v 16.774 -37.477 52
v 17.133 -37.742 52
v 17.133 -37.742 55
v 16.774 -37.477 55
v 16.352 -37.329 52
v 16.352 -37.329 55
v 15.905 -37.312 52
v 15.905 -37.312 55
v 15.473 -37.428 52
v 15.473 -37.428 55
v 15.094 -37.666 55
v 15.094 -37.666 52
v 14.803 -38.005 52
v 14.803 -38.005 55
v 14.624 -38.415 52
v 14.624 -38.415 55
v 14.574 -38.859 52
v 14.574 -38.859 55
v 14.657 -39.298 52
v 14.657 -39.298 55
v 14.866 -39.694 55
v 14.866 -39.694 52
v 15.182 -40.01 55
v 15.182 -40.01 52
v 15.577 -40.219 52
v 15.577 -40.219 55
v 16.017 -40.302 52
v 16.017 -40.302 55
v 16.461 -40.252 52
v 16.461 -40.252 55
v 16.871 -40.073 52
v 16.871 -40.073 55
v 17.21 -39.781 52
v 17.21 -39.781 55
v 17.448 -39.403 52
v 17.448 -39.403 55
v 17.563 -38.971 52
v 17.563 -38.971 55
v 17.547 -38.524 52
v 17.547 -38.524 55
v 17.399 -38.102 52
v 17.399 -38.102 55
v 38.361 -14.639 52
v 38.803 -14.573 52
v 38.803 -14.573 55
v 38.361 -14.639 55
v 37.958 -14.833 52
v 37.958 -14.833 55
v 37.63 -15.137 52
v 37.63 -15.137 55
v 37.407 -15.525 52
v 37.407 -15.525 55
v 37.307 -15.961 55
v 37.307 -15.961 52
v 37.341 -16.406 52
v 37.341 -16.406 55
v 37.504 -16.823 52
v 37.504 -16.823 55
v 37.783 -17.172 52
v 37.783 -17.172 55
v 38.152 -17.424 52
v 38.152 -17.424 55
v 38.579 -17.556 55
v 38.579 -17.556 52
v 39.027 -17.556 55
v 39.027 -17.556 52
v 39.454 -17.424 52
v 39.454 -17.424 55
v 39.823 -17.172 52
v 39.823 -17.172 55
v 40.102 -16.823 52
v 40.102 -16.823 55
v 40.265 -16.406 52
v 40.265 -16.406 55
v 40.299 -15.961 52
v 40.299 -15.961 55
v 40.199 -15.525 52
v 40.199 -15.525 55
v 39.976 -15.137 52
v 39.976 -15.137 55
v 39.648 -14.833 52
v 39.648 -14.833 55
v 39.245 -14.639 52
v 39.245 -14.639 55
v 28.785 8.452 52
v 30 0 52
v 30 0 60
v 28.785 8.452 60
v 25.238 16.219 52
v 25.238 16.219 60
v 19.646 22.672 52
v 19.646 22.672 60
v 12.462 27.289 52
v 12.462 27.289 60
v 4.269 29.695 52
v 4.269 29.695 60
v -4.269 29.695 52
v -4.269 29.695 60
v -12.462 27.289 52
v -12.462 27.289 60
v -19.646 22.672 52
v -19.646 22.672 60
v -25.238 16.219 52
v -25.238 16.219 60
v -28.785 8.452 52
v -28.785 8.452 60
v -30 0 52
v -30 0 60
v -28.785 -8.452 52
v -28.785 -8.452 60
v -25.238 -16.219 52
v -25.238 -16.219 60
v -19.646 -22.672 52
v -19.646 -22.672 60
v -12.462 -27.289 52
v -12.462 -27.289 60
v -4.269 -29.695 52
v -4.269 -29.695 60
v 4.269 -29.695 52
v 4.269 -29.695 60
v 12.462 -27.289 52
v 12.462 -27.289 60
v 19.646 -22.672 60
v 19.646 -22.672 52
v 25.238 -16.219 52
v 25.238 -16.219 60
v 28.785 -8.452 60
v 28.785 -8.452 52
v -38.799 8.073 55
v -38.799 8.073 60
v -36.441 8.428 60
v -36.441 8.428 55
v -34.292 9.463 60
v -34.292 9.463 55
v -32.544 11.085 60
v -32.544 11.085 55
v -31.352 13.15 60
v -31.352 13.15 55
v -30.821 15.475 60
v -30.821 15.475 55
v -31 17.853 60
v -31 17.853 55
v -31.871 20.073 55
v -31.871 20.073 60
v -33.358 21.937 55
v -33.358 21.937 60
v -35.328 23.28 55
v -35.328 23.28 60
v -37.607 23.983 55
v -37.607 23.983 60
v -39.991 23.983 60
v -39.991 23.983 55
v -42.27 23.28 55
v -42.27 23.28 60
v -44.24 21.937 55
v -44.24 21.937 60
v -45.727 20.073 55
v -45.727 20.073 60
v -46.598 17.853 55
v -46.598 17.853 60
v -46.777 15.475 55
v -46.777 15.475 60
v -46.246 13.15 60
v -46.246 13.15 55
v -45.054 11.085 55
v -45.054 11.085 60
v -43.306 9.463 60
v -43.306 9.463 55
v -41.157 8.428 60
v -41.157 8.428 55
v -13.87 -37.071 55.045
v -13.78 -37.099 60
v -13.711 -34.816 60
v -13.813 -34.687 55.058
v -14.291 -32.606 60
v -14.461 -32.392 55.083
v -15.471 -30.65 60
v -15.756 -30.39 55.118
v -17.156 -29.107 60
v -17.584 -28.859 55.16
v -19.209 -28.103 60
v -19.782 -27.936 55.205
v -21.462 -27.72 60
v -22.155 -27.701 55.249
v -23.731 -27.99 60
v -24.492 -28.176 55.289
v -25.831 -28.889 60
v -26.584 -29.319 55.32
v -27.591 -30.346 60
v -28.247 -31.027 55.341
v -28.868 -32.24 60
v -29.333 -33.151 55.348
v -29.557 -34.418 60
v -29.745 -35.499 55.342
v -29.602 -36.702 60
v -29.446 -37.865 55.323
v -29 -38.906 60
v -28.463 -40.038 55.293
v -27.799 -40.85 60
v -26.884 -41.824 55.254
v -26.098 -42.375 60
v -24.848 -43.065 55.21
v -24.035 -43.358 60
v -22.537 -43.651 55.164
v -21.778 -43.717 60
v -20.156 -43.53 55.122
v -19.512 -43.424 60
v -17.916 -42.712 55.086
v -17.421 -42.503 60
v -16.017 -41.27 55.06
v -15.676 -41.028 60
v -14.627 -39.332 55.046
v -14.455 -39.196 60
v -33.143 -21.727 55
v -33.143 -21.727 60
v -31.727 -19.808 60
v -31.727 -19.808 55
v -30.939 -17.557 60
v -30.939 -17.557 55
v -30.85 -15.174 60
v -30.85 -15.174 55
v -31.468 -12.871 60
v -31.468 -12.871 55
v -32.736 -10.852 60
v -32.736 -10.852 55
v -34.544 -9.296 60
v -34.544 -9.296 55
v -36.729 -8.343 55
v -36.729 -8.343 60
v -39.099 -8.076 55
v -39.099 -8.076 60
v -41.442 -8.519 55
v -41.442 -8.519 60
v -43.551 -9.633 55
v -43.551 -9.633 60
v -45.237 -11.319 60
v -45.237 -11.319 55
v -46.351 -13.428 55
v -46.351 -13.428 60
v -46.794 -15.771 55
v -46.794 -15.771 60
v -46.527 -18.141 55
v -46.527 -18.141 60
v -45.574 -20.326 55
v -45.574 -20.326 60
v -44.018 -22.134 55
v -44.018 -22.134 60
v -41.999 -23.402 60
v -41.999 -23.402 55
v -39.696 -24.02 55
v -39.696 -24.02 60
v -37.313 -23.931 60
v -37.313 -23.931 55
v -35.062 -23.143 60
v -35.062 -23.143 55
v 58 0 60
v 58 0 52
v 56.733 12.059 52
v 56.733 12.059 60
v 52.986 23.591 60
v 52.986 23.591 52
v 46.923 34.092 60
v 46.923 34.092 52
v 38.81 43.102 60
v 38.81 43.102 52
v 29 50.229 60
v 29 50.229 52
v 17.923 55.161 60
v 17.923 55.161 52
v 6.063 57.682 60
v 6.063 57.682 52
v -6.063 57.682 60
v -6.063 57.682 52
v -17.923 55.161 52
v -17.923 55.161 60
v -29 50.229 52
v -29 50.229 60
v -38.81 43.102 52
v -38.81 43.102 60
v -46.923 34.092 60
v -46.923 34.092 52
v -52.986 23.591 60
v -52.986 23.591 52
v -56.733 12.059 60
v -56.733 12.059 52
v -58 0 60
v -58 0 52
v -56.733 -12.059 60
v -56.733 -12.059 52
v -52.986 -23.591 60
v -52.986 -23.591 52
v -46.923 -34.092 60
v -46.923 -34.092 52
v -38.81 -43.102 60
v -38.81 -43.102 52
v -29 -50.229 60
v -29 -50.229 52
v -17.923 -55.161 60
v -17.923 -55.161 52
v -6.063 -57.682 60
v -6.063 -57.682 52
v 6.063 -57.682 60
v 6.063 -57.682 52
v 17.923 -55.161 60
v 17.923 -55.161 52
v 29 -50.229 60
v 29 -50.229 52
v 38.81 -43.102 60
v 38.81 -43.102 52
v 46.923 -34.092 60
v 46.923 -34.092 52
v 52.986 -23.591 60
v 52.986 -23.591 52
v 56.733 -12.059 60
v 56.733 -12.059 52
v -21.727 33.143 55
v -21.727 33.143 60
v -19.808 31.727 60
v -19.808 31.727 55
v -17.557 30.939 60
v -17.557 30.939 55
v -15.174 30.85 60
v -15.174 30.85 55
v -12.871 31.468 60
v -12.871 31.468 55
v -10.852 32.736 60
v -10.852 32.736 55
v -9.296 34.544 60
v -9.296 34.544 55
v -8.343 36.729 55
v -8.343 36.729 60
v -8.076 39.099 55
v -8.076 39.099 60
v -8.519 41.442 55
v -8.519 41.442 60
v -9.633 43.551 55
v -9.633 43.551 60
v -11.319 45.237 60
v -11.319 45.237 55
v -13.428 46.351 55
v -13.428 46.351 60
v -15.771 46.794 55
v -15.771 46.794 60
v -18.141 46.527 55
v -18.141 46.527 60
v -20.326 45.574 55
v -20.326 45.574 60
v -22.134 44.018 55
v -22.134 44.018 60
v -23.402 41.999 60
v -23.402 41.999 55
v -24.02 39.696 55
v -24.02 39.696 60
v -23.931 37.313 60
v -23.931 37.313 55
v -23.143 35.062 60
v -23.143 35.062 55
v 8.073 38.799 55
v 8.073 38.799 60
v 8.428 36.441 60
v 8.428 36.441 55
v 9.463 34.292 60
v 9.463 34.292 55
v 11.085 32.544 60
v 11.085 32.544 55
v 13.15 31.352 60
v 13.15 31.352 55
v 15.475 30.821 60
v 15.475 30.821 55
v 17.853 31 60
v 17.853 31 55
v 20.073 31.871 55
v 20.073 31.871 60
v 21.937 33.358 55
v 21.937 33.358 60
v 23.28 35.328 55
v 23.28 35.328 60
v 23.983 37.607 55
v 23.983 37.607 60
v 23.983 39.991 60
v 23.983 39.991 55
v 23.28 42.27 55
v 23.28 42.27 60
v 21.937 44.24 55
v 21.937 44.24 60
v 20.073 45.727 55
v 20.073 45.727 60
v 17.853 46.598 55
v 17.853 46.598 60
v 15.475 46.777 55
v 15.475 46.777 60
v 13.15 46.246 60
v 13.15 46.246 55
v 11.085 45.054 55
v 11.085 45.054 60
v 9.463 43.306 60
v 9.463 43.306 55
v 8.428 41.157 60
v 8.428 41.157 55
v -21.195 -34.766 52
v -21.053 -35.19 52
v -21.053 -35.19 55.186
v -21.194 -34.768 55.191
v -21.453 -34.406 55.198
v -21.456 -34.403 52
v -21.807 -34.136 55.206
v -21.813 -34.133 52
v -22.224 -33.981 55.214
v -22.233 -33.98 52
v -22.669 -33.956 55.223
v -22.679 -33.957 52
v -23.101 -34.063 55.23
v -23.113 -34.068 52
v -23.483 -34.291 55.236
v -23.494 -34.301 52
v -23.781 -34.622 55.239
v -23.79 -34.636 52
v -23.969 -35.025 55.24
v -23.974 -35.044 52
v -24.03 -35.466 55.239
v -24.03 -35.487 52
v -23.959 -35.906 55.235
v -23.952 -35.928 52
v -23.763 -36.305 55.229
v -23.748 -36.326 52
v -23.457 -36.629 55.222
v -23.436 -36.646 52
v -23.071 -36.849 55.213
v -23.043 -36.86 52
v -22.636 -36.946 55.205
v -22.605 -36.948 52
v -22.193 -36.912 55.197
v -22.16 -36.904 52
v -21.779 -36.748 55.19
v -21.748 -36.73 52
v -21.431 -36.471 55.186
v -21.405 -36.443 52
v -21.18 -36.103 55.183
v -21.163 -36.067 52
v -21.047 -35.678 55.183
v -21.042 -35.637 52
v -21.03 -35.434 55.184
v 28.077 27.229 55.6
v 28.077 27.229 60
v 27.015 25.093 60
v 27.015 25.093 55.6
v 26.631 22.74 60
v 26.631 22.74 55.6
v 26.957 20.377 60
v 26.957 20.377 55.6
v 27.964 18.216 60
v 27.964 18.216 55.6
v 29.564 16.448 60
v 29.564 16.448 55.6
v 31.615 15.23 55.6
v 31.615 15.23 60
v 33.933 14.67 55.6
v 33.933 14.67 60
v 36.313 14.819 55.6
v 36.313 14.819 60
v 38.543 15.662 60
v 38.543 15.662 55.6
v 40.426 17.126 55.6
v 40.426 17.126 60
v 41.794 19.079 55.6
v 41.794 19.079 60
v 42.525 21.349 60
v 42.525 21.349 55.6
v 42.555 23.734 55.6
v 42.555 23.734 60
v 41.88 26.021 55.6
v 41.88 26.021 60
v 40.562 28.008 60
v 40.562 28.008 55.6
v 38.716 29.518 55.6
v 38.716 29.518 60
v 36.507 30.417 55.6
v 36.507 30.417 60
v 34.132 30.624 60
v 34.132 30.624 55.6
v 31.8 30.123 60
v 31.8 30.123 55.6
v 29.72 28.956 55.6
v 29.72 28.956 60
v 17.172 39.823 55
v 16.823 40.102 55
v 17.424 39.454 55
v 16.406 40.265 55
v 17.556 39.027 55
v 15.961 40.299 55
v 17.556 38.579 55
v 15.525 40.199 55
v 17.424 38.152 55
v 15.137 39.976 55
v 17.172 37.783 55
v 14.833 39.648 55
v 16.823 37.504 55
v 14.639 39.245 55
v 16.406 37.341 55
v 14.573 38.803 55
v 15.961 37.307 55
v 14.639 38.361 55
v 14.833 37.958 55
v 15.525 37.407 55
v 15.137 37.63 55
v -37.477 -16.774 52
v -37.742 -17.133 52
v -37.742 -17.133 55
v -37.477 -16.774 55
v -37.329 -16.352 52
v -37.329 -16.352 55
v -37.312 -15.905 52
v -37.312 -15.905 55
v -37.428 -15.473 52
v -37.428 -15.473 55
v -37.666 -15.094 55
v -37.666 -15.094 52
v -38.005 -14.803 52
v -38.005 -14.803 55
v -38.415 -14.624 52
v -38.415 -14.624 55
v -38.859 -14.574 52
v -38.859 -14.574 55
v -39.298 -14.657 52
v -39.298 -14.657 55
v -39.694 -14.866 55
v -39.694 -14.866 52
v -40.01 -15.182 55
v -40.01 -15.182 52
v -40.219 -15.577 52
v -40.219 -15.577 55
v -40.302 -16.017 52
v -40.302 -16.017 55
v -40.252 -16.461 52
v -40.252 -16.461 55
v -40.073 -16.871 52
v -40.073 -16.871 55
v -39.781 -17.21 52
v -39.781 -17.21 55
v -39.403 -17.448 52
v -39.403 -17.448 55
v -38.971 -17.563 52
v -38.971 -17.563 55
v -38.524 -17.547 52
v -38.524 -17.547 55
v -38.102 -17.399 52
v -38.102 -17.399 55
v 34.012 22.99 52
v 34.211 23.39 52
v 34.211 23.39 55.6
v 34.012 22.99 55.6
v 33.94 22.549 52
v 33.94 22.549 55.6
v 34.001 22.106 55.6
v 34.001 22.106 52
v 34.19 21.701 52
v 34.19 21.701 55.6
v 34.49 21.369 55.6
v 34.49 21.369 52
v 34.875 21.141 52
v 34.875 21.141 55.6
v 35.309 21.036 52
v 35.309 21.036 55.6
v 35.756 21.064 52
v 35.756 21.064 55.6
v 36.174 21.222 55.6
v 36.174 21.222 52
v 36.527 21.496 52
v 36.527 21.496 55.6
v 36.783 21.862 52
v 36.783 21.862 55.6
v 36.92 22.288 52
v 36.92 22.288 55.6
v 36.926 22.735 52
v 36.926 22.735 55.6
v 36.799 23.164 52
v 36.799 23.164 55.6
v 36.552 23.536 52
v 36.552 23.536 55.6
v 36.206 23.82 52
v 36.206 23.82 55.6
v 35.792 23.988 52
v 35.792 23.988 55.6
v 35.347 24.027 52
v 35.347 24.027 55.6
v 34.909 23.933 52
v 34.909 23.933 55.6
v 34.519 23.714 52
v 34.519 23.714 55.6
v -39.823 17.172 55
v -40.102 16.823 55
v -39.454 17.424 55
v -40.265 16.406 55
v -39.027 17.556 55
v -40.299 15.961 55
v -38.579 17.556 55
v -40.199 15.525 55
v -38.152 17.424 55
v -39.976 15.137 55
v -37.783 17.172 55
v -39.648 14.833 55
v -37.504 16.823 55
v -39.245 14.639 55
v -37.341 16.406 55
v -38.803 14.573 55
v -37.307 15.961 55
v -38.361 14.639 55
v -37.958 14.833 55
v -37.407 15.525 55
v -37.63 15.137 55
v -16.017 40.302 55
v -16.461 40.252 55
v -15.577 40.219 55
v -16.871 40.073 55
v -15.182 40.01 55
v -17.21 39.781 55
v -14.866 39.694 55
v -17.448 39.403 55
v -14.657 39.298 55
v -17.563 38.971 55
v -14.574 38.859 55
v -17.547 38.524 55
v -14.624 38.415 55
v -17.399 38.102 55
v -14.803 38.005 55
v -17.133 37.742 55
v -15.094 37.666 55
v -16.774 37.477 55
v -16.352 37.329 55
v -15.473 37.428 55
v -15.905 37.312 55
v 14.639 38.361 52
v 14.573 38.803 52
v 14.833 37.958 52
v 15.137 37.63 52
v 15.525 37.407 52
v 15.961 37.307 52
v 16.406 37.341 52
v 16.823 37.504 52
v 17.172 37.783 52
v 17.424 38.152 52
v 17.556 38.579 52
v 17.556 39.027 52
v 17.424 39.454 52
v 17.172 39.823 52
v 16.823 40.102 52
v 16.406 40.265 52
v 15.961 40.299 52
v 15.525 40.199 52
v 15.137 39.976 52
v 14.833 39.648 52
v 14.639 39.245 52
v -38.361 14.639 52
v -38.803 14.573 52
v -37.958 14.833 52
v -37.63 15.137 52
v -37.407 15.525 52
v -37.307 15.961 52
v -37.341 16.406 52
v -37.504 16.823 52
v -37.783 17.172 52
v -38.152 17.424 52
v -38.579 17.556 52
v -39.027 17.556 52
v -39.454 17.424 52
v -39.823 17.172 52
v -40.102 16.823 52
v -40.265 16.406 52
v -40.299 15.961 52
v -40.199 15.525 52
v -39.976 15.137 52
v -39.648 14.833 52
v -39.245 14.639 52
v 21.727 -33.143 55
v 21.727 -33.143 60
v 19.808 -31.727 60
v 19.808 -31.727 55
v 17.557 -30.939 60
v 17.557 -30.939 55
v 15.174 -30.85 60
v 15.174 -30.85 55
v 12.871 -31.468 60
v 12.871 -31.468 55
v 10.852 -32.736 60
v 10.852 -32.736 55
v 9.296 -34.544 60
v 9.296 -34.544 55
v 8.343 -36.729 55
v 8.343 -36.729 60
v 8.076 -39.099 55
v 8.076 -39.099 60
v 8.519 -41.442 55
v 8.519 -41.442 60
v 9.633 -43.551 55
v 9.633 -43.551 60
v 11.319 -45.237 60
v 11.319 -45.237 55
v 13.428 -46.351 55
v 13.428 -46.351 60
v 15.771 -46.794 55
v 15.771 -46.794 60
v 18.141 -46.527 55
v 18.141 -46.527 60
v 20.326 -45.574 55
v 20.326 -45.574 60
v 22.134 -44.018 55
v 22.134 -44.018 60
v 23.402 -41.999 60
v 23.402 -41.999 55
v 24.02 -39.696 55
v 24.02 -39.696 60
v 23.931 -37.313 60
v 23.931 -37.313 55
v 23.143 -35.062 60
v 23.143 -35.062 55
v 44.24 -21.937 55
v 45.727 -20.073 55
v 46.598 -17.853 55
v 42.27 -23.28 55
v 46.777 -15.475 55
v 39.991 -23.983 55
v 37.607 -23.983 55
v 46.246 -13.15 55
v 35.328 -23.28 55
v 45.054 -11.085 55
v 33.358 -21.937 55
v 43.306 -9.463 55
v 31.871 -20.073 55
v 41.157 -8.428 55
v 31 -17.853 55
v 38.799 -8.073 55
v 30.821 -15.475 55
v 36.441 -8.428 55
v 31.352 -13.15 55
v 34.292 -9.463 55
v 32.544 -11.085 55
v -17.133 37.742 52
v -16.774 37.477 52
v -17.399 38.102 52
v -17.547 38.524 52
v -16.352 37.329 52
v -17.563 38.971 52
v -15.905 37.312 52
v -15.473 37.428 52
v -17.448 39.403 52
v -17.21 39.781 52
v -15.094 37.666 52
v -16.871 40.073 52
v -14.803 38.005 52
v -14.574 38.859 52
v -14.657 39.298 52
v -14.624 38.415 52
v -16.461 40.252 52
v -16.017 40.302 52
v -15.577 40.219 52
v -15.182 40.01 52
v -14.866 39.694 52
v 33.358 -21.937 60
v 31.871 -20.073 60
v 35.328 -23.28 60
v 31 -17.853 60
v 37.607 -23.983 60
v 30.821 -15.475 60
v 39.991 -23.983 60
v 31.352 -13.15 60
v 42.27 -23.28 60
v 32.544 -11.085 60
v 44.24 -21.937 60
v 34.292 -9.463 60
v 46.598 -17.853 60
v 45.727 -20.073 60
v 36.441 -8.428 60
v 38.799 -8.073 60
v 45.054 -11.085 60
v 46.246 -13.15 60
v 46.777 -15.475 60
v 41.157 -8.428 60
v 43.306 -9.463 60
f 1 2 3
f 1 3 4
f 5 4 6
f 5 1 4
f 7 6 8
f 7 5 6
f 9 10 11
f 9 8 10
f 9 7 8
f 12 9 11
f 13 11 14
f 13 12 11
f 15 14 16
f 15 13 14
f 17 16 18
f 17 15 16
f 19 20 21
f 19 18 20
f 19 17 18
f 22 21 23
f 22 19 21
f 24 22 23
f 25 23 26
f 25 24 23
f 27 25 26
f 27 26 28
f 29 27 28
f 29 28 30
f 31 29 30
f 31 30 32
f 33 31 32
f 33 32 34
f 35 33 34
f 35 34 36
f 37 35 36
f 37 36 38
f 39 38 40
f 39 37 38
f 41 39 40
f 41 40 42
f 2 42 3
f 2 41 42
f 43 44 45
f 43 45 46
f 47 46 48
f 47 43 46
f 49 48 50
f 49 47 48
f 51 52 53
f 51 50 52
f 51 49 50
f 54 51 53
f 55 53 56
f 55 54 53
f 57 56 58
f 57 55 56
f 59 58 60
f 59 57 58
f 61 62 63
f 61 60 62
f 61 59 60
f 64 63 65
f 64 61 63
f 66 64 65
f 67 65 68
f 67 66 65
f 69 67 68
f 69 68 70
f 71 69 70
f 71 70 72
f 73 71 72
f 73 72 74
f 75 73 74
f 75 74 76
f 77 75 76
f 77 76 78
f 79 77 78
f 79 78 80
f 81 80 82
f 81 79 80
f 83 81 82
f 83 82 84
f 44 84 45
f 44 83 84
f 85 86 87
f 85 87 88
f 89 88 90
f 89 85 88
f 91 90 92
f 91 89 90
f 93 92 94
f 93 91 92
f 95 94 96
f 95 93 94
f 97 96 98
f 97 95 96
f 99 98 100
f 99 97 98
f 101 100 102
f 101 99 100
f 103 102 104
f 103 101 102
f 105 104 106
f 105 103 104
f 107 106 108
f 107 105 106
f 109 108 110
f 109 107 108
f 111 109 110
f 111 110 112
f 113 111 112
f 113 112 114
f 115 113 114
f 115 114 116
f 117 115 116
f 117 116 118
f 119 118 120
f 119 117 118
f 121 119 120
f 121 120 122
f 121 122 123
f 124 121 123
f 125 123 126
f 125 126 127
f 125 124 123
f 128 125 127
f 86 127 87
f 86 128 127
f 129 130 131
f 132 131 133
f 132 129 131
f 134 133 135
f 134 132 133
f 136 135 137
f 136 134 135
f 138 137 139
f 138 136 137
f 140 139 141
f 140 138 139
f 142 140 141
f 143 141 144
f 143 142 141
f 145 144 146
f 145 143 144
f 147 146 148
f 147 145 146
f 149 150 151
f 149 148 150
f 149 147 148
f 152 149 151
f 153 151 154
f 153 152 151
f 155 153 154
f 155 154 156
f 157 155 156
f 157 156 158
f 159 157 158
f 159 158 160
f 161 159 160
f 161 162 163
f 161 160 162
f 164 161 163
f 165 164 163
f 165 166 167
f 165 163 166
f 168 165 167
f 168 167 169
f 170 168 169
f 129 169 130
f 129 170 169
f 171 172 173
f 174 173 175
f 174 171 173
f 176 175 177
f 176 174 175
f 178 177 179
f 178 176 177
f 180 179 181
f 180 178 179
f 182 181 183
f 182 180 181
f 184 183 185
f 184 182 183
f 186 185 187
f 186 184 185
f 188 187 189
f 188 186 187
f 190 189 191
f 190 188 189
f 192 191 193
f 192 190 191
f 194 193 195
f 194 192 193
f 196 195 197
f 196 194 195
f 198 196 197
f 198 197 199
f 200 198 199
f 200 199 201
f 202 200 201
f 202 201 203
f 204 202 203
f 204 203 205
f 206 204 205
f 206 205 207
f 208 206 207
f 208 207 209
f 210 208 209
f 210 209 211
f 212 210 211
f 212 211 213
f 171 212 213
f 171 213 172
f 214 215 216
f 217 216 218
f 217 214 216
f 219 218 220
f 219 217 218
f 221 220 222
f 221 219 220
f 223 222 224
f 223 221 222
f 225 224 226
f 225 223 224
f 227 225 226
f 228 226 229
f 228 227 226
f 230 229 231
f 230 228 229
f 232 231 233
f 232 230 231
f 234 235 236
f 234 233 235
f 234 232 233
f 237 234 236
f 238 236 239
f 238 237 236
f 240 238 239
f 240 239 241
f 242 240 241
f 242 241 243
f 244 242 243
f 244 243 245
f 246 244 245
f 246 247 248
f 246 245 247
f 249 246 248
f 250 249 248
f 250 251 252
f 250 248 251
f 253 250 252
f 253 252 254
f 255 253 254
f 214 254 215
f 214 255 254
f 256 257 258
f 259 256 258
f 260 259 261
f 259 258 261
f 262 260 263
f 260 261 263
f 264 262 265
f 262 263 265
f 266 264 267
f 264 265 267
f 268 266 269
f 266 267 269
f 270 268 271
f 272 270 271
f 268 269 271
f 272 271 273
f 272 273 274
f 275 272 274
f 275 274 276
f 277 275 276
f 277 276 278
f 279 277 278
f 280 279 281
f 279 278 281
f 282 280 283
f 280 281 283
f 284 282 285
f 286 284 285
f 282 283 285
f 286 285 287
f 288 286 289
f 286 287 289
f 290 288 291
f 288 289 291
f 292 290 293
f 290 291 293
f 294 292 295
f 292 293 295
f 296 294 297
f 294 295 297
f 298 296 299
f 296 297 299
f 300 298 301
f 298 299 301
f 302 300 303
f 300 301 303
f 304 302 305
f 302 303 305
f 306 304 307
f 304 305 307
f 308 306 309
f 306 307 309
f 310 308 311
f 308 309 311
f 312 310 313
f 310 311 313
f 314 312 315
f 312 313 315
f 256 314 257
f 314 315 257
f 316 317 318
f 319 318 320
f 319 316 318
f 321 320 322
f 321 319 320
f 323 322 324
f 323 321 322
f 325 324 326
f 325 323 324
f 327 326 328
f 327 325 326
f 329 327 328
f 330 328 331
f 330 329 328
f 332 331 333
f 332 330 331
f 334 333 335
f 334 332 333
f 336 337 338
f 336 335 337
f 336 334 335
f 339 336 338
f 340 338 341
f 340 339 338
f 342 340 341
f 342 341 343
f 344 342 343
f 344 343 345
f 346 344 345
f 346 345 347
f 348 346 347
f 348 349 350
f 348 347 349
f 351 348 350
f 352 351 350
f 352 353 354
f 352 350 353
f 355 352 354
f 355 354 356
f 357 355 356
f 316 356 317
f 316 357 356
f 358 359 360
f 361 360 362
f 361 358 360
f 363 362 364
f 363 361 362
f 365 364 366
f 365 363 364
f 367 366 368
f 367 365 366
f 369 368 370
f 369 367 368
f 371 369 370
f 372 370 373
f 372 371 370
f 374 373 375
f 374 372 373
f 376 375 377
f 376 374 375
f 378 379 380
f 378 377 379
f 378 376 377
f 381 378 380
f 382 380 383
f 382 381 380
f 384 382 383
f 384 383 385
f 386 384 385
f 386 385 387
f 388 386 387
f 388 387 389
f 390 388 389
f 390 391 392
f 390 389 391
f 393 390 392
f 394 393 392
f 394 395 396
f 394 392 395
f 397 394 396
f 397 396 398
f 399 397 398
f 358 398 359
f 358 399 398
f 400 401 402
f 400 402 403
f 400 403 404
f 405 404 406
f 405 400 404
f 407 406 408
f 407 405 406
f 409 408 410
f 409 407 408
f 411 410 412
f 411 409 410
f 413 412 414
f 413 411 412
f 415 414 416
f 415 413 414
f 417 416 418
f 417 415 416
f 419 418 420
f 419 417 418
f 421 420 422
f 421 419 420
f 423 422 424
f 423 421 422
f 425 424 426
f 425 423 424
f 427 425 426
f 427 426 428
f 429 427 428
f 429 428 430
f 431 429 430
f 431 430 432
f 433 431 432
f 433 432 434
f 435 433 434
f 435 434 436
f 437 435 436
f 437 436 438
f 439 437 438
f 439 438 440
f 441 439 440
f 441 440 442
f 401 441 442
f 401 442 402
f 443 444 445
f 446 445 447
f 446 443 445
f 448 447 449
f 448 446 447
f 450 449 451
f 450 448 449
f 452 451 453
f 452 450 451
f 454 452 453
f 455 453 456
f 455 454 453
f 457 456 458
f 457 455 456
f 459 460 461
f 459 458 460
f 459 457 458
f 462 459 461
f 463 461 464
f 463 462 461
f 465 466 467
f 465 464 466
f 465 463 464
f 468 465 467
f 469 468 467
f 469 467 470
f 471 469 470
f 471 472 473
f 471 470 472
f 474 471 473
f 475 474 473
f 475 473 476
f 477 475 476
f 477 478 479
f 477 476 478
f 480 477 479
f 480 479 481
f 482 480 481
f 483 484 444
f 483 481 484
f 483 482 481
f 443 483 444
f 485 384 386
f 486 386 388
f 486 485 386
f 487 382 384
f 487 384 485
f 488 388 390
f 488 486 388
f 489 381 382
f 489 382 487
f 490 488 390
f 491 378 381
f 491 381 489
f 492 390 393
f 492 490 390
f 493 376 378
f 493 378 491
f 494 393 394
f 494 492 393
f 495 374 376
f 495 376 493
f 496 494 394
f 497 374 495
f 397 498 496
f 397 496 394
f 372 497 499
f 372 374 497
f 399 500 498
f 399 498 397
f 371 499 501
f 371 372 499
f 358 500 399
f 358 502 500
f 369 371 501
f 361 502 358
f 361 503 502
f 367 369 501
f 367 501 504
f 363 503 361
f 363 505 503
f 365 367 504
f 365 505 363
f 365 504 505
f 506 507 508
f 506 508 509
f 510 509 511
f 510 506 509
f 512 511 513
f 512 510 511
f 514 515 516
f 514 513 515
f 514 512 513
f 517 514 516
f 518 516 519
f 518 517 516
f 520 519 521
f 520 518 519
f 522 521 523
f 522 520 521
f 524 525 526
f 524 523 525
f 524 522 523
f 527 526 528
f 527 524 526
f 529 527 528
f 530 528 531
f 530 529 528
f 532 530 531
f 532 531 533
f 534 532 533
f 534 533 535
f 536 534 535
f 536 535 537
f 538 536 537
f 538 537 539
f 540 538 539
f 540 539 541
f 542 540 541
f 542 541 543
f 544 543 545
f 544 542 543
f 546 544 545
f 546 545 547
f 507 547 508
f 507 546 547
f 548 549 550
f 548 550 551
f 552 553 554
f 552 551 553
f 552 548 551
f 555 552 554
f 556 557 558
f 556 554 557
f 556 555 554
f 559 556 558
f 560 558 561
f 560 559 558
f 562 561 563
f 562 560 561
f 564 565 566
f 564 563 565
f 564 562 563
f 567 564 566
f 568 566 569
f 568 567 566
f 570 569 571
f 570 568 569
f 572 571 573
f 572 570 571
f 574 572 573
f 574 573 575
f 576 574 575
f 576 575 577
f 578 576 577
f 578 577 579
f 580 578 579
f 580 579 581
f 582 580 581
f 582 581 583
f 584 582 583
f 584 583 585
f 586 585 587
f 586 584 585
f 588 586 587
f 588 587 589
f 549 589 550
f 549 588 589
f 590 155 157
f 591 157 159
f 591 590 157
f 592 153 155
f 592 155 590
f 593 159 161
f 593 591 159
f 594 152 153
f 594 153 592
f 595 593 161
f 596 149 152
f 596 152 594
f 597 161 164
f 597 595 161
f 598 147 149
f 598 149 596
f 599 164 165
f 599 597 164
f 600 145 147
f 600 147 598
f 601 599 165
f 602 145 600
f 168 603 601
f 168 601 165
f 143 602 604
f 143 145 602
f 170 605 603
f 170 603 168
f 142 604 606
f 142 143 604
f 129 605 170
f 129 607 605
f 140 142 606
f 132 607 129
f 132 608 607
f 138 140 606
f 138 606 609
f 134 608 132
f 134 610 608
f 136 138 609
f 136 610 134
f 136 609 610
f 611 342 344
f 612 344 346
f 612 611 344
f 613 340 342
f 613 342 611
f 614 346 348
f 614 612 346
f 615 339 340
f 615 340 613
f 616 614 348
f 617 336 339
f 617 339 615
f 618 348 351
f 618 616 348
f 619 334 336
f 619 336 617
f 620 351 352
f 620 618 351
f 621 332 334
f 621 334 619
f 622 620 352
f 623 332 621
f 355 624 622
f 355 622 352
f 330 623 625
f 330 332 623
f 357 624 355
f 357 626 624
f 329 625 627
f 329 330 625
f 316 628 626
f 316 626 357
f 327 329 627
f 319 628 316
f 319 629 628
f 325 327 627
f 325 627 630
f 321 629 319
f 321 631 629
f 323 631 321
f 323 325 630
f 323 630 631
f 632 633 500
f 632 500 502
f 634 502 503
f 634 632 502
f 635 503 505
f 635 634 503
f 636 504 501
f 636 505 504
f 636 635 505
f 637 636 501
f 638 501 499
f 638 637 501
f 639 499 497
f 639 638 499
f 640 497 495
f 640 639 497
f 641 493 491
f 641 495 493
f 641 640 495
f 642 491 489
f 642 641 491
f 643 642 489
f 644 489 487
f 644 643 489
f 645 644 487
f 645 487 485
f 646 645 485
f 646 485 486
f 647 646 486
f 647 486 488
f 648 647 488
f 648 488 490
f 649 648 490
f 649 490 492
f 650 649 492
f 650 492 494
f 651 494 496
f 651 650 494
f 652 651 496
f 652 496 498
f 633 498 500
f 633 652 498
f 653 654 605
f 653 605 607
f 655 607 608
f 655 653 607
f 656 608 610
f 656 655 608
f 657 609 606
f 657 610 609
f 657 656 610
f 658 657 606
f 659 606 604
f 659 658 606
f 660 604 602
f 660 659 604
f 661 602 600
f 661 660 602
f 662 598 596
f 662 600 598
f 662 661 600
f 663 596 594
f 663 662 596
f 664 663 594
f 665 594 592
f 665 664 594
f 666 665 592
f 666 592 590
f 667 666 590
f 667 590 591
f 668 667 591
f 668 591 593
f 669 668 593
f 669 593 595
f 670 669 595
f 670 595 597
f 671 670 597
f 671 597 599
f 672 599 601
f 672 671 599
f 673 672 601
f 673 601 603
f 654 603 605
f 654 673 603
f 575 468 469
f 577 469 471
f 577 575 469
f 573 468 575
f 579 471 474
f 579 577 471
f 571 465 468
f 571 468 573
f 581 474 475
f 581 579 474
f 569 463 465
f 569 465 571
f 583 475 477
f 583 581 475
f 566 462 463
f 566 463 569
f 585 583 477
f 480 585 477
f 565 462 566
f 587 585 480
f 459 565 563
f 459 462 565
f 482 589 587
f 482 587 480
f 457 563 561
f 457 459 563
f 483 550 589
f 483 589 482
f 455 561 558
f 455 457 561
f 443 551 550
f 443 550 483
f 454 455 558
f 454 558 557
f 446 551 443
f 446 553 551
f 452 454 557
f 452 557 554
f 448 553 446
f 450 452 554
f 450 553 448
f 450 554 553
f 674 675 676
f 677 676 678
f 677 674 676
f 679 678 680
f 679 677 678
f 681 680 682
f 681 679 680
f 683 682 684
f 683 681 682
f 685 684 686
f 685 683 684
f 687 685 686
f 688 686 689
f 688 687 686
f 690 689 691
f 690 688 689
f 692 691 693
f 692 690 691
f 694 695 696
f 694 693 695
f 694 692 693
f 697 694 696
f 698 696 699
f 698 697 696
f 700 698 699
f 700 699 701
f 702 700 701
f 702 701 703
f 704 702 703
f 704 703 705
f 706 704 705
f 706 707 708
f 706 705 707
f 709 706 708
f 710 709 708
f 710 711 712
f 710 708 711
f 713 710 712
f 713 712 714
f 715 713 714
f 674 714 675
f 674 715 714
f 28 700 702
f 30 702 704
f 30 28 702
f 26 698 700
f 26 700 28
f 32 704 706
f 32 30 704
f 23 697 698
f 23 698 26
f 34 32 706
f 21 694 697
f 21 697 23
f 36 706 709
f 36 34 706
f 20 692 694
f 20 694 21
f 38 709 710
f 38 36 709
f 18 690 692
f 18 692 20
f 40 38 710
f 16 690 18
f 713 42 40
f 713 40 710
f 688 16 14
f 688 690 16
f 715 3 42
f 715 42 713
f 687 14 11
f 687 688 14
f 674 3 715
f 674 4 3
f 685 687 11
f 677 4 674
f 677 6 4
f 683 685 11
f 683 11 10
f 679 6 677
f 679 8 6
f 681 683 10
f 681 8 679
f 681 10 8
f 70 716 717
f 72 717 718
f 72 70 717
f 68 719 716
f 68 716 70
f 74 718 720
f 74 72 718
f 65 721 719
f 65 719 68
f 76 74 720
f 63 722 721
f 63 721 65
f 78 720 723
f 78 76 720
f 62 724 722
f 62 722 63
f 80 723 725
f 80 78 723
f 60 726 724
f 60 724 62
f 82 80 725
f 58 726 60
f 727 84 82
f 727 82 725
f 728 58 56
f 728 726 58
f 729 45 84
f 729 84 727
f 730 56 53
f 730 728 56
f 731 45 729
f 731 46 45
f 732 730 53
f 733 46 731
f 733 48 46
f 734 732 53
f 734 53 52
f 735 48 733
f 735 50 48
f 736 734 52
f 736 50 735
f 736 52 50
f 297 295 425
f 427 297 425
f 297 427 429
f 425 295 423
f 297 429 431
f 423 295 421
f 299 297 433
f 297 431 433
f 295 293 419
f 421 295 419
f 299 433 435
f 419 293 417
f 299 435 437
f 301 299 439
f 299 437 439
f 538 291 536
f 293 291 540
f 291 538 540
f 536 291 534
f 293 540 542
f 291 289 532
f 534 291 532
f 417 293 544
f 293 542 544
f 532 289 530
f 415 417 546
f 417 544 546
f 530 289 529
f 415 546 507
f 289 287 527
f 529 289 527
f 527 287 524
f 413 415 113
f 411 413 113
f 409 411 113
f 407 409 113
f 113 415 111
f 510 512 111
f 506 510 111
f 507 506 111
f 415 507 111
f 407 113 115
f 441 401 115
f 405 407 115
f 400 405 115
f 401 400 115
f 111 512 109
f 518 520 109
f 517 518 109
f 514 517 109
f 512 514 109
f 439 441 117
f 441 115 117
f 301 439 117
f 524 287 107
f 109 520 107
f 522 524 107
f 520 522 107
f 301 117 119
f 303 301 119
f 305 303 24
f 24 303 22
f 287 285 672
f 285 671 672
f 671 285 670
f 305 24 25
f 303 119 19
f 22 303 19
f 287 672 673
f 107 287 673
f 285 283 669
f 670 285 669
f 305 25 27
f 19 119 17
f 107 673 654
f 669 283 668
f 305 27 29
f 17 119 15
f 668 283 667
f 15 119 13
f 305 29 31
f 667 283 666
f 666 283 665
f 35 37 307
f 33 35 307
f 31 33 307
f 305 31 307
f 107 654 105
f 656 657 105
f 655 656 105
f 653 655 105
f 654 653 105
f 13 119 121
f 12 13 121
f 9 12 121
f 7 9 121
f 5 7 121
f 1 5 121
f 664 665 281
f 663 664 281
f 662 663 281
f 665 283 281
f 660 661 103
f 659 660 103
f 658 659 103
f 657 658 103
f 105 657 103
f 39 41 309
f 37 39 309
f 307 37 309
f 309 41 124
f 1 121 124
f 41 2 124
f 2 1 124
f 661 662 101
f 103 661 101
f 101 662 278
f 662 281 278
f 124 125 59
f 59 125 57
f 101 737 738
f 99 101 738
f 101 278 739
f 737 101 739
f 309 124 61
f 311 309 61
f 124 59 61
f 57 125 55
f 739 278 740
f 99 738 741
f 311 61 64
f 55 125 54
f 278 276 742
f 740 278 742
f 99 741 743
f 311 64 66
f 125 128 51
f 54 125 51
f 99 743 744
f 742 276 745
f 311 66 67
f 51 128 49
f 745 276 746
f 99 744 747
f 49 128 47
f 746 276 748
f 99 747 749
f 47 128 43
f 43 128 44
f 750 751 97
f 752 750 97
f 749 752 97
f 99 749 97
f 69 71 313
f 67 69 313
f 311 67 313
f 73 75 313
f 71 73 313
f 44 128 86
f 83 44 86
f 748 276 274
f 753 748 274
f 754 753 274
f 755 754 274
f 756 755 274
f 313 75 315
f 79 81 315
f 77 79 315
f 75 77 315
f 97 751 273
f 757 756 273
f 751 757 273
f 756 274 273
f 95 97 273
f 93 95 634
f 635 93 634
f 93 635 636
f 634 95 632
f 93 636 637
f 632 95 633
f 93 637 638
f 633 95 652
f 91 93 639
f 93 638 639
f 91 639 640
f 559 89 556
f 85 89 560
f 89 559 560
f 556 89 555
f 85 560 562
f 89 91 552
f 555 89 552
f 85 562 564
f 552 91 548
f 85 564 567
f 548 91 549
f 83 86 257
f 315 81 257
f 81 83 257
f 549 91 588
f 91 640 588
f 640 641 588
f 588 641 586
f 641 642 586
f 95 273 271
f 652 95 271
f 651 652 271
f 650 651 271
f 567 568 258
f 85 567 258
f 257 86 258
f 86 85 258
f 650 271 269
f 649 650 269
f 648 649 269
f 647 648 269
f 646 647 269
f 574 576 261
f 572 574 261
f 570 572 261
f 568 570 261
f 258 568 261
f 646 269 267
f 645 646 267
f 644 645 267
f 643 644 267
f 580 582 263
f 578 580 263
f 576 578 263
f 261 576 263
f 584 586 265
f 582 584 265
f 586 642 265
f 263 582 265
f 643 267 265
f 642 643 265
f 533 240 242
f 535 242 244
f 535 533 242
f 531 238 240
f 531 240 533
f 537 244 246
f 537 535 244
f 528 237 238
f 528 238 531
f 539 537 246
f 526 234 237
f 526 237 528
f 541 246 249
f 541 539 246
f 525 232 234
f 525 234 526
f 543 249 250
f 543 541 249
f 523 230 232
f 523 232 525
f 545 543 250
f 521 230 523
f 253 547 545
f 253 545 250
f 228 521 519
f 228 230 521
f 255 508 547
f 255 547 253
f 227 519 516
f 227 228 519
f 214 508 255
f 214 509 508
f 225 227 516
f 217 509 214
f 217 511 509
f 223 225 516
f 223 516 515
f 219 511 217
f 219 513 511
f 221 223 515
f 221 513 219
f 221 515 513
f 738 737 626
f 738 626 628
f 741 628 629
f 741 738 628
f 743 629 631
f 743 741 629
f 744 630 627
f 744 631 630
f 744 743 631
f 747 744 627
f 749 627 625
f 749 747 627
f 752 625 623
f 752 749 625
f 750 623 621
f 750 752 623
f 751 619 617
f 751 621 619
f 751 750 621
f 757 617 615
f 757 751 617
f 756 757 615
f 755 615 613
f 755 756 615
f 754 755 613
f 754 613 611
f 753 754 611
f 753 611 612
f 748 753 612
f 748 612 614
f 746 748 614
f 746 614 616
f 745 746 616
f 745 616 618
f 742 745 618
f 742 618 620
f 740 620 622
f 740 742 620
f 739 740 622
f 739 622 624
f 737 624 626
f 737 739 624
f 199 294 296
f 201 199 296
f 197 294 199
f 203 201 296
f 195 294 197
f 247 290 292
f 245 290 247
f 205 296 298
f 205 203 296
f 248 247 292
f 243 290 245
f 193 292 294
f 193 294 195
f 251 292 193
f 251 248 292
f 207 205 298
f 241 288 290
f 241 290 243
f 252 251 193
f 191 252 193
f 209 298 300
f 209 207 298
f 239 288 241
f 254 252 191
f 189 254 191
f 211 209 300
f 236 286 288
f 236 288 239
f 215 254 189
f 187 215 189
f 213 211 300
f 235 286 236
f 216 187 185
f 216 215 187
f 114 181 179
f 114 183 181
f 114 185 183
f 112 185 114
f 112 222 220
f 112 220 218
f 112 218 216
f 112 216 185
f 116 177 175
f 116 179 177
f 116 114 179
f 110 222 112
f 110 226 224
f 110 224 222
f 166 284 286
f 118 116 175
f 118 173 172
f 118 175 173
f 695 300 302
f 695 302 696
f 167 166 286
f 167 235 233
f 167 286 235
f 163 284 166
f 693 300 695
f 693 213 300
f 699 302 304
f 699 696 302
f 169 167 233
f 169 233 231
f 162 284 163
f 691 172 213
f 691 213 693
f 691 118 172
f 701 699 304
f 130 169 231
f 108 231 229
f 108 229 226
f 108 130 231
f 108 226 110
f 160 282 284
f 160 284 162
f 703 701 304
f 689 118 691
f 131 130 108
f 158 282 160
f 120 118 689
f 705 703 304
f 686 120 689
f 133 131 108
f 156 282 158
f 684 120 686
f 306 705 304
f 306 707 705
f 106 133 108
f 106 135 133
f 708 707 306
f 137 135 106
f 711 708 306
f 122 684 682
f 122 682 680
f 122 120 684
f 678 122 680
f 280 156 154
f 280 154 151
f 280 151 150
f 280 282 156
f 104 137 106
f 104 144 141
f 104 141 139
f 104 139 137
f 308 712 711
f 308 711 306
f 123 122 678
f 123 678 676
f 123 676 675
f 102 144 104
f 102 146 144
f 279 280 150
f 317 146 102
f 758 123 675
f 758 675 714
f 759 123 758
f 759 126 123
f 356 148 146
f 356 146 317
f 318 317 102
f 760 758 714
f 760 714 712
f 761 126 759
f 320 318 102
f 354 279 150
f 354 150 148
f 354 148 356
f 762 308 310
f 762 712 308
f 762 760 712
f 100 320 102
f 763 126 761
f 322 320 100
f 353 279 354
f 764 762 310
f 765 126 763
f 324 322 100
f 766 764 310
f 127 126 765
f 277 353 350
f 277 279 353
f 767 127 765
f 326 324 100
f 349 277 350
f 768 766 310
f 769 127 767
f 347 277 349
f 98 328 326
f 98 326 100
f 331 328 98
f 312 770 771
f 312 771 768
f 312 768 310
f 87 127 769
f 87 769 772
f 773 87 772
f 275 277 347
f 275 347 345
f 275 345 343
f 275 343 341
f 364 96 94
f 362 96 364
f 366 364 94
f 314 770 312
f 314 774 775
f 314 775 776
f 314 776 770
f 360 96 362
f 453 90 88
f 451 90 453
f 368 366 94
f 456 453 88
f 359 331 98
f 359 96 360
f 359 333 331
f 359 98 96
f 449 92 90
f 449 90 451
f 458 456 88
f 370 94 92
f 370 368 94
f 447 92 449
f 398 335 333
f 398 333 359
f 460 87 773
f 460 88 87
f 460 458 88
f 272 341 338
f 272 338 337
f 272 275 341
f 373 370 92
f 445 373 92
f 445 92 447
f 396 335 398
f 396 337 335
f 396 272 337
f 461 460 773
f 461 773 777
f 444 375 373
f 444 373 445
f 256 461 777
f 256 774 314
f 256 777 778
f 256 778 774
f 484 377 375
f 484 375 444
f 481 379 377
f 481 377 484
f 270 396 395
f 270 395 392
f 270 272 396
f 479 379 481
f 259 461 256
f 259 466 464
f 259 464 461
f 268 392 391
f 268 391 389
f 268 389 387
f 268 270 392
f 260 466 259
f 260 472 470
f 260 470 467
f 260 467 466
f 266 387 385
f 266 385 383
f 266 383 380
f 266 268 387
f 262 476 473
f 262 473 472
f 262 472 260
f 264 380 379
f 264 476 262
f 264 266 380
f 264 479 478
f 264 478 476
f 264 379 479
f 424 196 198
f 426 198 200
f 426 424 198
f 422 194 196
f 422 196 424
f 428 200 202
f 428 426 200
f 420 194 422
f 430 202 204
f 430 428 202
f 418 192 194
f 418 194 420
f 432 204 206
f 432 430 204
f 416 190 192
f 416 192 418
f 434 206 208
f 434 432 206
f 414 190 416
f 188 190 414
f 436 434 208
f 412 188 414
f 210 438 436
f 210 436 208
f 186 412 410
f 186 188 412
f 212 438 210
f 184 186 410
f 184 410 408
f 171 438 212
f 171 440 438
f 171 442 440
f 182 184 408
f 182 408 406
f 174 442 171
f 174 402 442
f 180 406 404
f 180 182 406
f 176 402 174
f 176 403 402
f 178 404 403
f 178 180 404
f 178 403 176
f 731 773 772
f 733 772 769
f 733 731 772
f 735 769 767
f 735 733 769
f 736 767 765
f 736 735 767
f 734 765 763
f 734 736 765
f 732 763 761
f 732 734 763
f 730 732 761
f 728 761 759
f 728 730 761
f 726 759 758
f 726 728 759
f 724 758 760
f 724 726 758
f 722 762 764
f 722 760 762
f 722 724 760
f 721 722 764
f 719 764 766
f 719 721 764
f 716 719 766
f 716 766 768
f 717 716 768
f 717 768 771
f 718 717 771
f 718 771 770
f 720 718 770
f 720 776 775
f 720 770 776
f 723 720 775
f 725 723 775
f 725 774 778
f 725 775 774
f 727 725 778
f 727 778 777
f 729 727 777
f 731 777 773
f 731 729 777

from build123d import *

# Parameters (mm, degrees)
CYLINDER702_R               = 1.5
CYLINDER702_DEPTH           = 100
CYLINDER708_R               = 1.5
CYLINDER708_DEPTH           = 100
CYLINDER708_PLACEMENT_ANGLE = 145
CYLINDER699_R               = 1.5
CYLINDER699_DEPTH           = 100
CYLINDER707_R               = 1.5
CYLINDER707_DEPTH           = 100
CYLINDER707_PLACEMENT_ANGLE = 225
CYLINDER711_R               = 1.5
CYLINDER711_DEPTH           = 100
CYLINDER710_R               = 1.5
CYLINDER710_DEPTH           = 100
CYLINDER710_PLACEMENT_ANGLE = 45
CYLINDER701_R               = 1.5
CYLINDER701_DEPTH           = 100
CYLINDER701_PLACEMENT_ANGLE = 10
CYLINDER706_R               = 1.5
CYLINDER706_DEPTH           = 100
CYLINDER706_PLACEMENT_ANGLE = 45
CYLINDER713_R               = 8
CYLINDER713_DEPTH           = 18
CYLINDER704_R               = 8
CYLINDER704_DEPTH           = 18
CYLINDER704_PLACEMENT_ANGLE = 225
CYLINDER700_R               = 8
CYLINDER700_DEPTH           = 18
CYLINDER698_R               = 8
CYLINDER698_DEPTH           = 18
CYLINDER698_PLACEMENT_ANGLE = 145
CYLINDER712_R               = 8
CYLINDER712_DEPTH           = 18
CYLINDER709_R               = 8
CYLINDER709_DEPTH           = 18
CYLINDER709_PLACEMENT_ANGLE = 45
CYLINDER705_R               = 8
CYLINDER705_DEPTH           = 18
CYLINDER705_ROLL_ANGLE      = 0.146073
CYLINDER705_PITCH_ANGLE     = 1.079101
CYLINDER705_PLACEMENT_ANGLE = -9.939308
CYLINDER703_R               = 8
CYLINDER703_DEPTH           = 18
CYLINDER703_PLACEMENT_ANGLE = 45
TUBE076_R                   = 58
TUBE076_R_2                 = 30
TUBE076_DEPTH               = 8


with BuildPart() as v_lec702:
    # Cylinder702 → Cylinder702 (new body)
    with BuildSketch(Plane(origin=(38.80294, -16.072704, 0), x_dir=(0, 1, 0), z_dir=(0, 0, 1))):
        Circle(CYLINDER702_R)
    extrude(amount=CYLINDER702_DEPTH)


with BuildPart() as v_lec708:
    # Cylinder708 → Cylinder708 (new body)
    with BuildSketch(Plane.XY):
        Circle(CYLINDER708_R)
    extrude(amount=CYLINDER708_DEPTH)


with BuildPart() as v_lec708_1:
    # Cylinder708 placement: moved
    add(v_lec708.part.moved(Location((35.44, 22.53, 0.61))).rotate(Axis((35.44, 22.53, 0.61), (0, 0, 1)), CYLINDER708_PLACEMENT_ANGLE))


with BuildPart() as v_lec699:
    # Cylinder699 → Cylinder699 (new body)
    with BuildSketch(Plane(origin=(16.072704, 38.80294, 0), x_dir=(-1, 0, 0), z_dir=(0, 0, 1))):
        Circle(CYLINDER699_R)
    extrude(amount=CYLINDER699_DEPTH)


with BuildPart() as v_lec707:
    # Cylinder707 → Cylinder707 (new body)
    with BuildSketch(Plane.XY):
        Circle(CYLINDER707_R)
    extrude(amount=CYLINDER707_DEPTH)


with BuildPart() as v_lec707_1:
    # Cylinder707 placement: moved
    add(v_lec707.part.moved(Location((-16.072704, 38.80294, 0))).rotate(Axis((-16.072704, 38.80294, 0), (0, 0, 1)), CYLINDER707_PLACEMENT_ANGLE))


with BuildPart() as v_lec711:
    # Cylinder711 → Cylinder711 (new body)
    with BuildSketch(Plane(origin=(-38.80294, 16.072704, 0), x_dir=(0, -1, 0), z_dir=(0, 0, 1))):
        Circle(CYLINDER711_R)
    extrude(amount=CYLINDER711_DEPTH)


with BuildPart() as v_lec710:
    # Cylinder710 → Cylinder710 (new body)
    with BuildSketch(Plane.XY):
        Circle(CYLINDER710_R)
    extrude(amount=CYLINDER710_DEPTH)


with BuildPart() as v_lec710_1:
    # Cylinder710 placement: moved
    add(v_lec710.part.moved(Location((-38.80294, -16.072704, 0))).rotate(Axis((-38.80294, -16.072704, 0), (0, 0, -1)), CYLINDER710_PLACEMENT_ANGLE))


with BuildPart() as v_lec701:
    # Cylinder701 → Cylinder701 (new body)
    with BuildSketch(Plane.XY):
        Circle(CYLINDER701_R)
    extrude(amount=CYLINDER701_DEPTH)


with BuildPart() as v_lec701_1:
    # Cylinder701 placement: moved
    add(v_lec701.part.moved(Location((-22.53, -35.45, 0.2))).rotate(Axis((-22.53, -35.45, 0.2), (0, 0, 1)), CYLINDER701_PLACEMENT_ANGLE))


with BuildPart() as compound697:
    # Cylinder706 → Cylinder706 (new body)
    with BuildSketch(Plane.XY):
        Circle(CYLINDER706_R)
    extrude(amount=CYLINDER706_DEPTH)


with BuildPart() as compound697_1:
    # Cylinder706 placement: moved
    add(compound697.part.moved(Location((16.072704, -38.80294, 0))).rotate(Axis((16.072704, -38.80294, 0), (0, 0, 1)), CYLINDER706_PLACEMENT_ANGLE))

    # Compound697: union Válec702, Válec708, Válec699, Válec707, Válec711, Válec710, Válec701
    add(v_lec702.part)
    add(v_lec708_1.part)
    add(v_lec699.part)
    add(v_lec707_1.part)
    add(v_lec711.part)
    add(v_lec710_1.part)
    add(v_lec701_1.part)


with BuildPart() as v_lec713:
    # Cylinder713 → Cylinder713 (new body)
    with BuildSketch(Plane(origin=(-38.798949, 16.072537, 43), x_dir=(0, -1, 0), z_dir=(0, 0, 1))):
        Circle(CYLINDER713_R)
    extrude(amount=CYLINDER713_DEPTH)


with BuildPart() as v_lec704:
    # Cylinder704 → Cylinder704 (new body)
    with BuildSketch(Plane.XY):
        Circle(CYLINDER704_R)
    extrude(amount=CYLINDER704_DEPTH)


with BuildPart() as v_lec704_1:
    # Cylinder704 placement: moved
    add(v_lec704.part.moved(Location((-16.07, 38.8, 43))).rotate(Axis((-16.07, 38.8, 43), (0, 0, 1)), CYLINDER704_PLACEMENT_ANGLE))


with BuildPart() as v_lec700:
    # Cylinder700 → Cylinder700 (new body)
    with BuildSketch(Plane(origin=(16.072537, 38.798949, 43), x_dir=(-1, 0, 0), z_dir=(0, 0, 1))):
        Circle(CYLINDER700_R)
    extrude(amount=CYLINDER700_DEPTH)


with BuildPart() as v_lec698:
    # Cylinder698 → Cylinder698 (new body)
    with BuildSketch(Plane.XY):
        Circle(CYLINDER698_R)
    extrude(amount=CYLINDER698_DEPTH)


with BuildPart() as v_lec698_1:
    # Cylinder698 placement: moved
    add(v_lec698.part.moved(Location((34.63, 22.64, 43.6))).rotate(Axis((34.63, 22.64, 43.6), (0, 0, 1)), CYLINDER698_PLACEMENT_ANGLE))


with BuildPart() as v_lec712:
    # Cylinder712 → Cylinder712 (new body)
    with BuildSketch(Plane(origin=(38.798949, -16.072537, 43), x_dir=(0, 1, 0), z_dir=(0, 0, 1))):
        Circle(CYLINDER712_R)
    extrude(amount=CYLINDER712_DEPTH)


with BuildPart() as v_lec709:
    # Cylinder709 → Cylinder709 (new body)
    with BuildSketch(Plane.XY):
        Circle(CYLINDER709_R)
    extrude(amount=CYLINDER709_DEPTH)


with BuildPart() as v_lec709_1:
    # Cylinder709 placement: moved
    add(v_lec709.part.moved(Location((16.07, -38.8, 43))).rotate(Axis((16.07, -38.8, 43), (0, 0, 1)), CYLINDER709_PLACEMENT_ANGLE))


with BuildPart() as v_lec705:
    # Cylinder705 → Cylinder705 (new body)
    with BuildSketch(Plane.XY):
        Circle(CYLINDER705_R)
    extrude(amount=CYLINDER705_DEPTH)


with BuildPart() as v_lec705_1:
    # Cylinder705 roll: moved
    add(v_lec705.part.rotate(Axis((0, 0, 0), (1, 0, 0)), CYLINDER705_ROLL_ANGLE))


with BuildPart() as v_lec705_2:
    # Cylinder705 pitch: moved
    add(v_lec705_1.part.rotate(Axis((0, 0, 0), (0, 1, 0)), CYLINDER705_PITCH_ANGLE))


with BuildPart() as v_lec705_3:
    # Cylinder705 placement: moved
    add(v_lec705_2.part.moved(Location((-21.748471, -35.690226, 43.196026))).rotate(Axis((-21.748471, -35.690226, 43.196026), (0, 0, 1)), CYLINDER705_PLACEMENT_ANGLE))


with BuildPart() as compound698:
    # Cylinder703 → Cylinder703 (new body)
    with BuildSketch(Plane.XY):
        Circle(CYLINDER703_R)
    extrude(amount=CYLINDER703_DEPTH)


with BuildPart() as compound698_1:
    # Cylinder703 placement: moved
    add(compound698.part.moved(Location((-38.8, -16.07, 43))).rotate(Axis((-38.8, -16.07, 43), (0, 0, -1)), CYLINDER703_PLACEMENT_ANGLE))

    # Compound698: union Válec713, Válec704, Válec700, Válec698, Válec712, Válec709, Válec705
    add(v_lec713.part)
    add(v_lec704_1.part)
    add(v_lec700.part)
    add(v_lec698_1.part)
    add(v_lec712.part)
    add(v_lec709_1.part)
    add(v_lec705_3.part)


with BuildPart() as compound698_2:
    # Compound698 placement: moved
    add(compound698_1.part.moved(Location((0, 0, 12))))


with BuildPart() as bazovina_part_f_dirovina002:
    # Tube076 → Tube076 (new body)
    with BuildSketch(Plane.XY.offset(52)):
        Circle(TUBE076_R)
        Circle(TUBE076_R_2, mode=Mode.SUBTRACT)
    extrude(amount=TUBE076_DEPTH)

    # Cut318: cut Compound698
    add(compound698_2.part, mode=Mode.SUBTRACT)

    # Cut319: cut Compound697
    add(compound697_1.part, mode=Mode.SUBTRACT)


solid = bazovina_part_f_dirovina002.part
